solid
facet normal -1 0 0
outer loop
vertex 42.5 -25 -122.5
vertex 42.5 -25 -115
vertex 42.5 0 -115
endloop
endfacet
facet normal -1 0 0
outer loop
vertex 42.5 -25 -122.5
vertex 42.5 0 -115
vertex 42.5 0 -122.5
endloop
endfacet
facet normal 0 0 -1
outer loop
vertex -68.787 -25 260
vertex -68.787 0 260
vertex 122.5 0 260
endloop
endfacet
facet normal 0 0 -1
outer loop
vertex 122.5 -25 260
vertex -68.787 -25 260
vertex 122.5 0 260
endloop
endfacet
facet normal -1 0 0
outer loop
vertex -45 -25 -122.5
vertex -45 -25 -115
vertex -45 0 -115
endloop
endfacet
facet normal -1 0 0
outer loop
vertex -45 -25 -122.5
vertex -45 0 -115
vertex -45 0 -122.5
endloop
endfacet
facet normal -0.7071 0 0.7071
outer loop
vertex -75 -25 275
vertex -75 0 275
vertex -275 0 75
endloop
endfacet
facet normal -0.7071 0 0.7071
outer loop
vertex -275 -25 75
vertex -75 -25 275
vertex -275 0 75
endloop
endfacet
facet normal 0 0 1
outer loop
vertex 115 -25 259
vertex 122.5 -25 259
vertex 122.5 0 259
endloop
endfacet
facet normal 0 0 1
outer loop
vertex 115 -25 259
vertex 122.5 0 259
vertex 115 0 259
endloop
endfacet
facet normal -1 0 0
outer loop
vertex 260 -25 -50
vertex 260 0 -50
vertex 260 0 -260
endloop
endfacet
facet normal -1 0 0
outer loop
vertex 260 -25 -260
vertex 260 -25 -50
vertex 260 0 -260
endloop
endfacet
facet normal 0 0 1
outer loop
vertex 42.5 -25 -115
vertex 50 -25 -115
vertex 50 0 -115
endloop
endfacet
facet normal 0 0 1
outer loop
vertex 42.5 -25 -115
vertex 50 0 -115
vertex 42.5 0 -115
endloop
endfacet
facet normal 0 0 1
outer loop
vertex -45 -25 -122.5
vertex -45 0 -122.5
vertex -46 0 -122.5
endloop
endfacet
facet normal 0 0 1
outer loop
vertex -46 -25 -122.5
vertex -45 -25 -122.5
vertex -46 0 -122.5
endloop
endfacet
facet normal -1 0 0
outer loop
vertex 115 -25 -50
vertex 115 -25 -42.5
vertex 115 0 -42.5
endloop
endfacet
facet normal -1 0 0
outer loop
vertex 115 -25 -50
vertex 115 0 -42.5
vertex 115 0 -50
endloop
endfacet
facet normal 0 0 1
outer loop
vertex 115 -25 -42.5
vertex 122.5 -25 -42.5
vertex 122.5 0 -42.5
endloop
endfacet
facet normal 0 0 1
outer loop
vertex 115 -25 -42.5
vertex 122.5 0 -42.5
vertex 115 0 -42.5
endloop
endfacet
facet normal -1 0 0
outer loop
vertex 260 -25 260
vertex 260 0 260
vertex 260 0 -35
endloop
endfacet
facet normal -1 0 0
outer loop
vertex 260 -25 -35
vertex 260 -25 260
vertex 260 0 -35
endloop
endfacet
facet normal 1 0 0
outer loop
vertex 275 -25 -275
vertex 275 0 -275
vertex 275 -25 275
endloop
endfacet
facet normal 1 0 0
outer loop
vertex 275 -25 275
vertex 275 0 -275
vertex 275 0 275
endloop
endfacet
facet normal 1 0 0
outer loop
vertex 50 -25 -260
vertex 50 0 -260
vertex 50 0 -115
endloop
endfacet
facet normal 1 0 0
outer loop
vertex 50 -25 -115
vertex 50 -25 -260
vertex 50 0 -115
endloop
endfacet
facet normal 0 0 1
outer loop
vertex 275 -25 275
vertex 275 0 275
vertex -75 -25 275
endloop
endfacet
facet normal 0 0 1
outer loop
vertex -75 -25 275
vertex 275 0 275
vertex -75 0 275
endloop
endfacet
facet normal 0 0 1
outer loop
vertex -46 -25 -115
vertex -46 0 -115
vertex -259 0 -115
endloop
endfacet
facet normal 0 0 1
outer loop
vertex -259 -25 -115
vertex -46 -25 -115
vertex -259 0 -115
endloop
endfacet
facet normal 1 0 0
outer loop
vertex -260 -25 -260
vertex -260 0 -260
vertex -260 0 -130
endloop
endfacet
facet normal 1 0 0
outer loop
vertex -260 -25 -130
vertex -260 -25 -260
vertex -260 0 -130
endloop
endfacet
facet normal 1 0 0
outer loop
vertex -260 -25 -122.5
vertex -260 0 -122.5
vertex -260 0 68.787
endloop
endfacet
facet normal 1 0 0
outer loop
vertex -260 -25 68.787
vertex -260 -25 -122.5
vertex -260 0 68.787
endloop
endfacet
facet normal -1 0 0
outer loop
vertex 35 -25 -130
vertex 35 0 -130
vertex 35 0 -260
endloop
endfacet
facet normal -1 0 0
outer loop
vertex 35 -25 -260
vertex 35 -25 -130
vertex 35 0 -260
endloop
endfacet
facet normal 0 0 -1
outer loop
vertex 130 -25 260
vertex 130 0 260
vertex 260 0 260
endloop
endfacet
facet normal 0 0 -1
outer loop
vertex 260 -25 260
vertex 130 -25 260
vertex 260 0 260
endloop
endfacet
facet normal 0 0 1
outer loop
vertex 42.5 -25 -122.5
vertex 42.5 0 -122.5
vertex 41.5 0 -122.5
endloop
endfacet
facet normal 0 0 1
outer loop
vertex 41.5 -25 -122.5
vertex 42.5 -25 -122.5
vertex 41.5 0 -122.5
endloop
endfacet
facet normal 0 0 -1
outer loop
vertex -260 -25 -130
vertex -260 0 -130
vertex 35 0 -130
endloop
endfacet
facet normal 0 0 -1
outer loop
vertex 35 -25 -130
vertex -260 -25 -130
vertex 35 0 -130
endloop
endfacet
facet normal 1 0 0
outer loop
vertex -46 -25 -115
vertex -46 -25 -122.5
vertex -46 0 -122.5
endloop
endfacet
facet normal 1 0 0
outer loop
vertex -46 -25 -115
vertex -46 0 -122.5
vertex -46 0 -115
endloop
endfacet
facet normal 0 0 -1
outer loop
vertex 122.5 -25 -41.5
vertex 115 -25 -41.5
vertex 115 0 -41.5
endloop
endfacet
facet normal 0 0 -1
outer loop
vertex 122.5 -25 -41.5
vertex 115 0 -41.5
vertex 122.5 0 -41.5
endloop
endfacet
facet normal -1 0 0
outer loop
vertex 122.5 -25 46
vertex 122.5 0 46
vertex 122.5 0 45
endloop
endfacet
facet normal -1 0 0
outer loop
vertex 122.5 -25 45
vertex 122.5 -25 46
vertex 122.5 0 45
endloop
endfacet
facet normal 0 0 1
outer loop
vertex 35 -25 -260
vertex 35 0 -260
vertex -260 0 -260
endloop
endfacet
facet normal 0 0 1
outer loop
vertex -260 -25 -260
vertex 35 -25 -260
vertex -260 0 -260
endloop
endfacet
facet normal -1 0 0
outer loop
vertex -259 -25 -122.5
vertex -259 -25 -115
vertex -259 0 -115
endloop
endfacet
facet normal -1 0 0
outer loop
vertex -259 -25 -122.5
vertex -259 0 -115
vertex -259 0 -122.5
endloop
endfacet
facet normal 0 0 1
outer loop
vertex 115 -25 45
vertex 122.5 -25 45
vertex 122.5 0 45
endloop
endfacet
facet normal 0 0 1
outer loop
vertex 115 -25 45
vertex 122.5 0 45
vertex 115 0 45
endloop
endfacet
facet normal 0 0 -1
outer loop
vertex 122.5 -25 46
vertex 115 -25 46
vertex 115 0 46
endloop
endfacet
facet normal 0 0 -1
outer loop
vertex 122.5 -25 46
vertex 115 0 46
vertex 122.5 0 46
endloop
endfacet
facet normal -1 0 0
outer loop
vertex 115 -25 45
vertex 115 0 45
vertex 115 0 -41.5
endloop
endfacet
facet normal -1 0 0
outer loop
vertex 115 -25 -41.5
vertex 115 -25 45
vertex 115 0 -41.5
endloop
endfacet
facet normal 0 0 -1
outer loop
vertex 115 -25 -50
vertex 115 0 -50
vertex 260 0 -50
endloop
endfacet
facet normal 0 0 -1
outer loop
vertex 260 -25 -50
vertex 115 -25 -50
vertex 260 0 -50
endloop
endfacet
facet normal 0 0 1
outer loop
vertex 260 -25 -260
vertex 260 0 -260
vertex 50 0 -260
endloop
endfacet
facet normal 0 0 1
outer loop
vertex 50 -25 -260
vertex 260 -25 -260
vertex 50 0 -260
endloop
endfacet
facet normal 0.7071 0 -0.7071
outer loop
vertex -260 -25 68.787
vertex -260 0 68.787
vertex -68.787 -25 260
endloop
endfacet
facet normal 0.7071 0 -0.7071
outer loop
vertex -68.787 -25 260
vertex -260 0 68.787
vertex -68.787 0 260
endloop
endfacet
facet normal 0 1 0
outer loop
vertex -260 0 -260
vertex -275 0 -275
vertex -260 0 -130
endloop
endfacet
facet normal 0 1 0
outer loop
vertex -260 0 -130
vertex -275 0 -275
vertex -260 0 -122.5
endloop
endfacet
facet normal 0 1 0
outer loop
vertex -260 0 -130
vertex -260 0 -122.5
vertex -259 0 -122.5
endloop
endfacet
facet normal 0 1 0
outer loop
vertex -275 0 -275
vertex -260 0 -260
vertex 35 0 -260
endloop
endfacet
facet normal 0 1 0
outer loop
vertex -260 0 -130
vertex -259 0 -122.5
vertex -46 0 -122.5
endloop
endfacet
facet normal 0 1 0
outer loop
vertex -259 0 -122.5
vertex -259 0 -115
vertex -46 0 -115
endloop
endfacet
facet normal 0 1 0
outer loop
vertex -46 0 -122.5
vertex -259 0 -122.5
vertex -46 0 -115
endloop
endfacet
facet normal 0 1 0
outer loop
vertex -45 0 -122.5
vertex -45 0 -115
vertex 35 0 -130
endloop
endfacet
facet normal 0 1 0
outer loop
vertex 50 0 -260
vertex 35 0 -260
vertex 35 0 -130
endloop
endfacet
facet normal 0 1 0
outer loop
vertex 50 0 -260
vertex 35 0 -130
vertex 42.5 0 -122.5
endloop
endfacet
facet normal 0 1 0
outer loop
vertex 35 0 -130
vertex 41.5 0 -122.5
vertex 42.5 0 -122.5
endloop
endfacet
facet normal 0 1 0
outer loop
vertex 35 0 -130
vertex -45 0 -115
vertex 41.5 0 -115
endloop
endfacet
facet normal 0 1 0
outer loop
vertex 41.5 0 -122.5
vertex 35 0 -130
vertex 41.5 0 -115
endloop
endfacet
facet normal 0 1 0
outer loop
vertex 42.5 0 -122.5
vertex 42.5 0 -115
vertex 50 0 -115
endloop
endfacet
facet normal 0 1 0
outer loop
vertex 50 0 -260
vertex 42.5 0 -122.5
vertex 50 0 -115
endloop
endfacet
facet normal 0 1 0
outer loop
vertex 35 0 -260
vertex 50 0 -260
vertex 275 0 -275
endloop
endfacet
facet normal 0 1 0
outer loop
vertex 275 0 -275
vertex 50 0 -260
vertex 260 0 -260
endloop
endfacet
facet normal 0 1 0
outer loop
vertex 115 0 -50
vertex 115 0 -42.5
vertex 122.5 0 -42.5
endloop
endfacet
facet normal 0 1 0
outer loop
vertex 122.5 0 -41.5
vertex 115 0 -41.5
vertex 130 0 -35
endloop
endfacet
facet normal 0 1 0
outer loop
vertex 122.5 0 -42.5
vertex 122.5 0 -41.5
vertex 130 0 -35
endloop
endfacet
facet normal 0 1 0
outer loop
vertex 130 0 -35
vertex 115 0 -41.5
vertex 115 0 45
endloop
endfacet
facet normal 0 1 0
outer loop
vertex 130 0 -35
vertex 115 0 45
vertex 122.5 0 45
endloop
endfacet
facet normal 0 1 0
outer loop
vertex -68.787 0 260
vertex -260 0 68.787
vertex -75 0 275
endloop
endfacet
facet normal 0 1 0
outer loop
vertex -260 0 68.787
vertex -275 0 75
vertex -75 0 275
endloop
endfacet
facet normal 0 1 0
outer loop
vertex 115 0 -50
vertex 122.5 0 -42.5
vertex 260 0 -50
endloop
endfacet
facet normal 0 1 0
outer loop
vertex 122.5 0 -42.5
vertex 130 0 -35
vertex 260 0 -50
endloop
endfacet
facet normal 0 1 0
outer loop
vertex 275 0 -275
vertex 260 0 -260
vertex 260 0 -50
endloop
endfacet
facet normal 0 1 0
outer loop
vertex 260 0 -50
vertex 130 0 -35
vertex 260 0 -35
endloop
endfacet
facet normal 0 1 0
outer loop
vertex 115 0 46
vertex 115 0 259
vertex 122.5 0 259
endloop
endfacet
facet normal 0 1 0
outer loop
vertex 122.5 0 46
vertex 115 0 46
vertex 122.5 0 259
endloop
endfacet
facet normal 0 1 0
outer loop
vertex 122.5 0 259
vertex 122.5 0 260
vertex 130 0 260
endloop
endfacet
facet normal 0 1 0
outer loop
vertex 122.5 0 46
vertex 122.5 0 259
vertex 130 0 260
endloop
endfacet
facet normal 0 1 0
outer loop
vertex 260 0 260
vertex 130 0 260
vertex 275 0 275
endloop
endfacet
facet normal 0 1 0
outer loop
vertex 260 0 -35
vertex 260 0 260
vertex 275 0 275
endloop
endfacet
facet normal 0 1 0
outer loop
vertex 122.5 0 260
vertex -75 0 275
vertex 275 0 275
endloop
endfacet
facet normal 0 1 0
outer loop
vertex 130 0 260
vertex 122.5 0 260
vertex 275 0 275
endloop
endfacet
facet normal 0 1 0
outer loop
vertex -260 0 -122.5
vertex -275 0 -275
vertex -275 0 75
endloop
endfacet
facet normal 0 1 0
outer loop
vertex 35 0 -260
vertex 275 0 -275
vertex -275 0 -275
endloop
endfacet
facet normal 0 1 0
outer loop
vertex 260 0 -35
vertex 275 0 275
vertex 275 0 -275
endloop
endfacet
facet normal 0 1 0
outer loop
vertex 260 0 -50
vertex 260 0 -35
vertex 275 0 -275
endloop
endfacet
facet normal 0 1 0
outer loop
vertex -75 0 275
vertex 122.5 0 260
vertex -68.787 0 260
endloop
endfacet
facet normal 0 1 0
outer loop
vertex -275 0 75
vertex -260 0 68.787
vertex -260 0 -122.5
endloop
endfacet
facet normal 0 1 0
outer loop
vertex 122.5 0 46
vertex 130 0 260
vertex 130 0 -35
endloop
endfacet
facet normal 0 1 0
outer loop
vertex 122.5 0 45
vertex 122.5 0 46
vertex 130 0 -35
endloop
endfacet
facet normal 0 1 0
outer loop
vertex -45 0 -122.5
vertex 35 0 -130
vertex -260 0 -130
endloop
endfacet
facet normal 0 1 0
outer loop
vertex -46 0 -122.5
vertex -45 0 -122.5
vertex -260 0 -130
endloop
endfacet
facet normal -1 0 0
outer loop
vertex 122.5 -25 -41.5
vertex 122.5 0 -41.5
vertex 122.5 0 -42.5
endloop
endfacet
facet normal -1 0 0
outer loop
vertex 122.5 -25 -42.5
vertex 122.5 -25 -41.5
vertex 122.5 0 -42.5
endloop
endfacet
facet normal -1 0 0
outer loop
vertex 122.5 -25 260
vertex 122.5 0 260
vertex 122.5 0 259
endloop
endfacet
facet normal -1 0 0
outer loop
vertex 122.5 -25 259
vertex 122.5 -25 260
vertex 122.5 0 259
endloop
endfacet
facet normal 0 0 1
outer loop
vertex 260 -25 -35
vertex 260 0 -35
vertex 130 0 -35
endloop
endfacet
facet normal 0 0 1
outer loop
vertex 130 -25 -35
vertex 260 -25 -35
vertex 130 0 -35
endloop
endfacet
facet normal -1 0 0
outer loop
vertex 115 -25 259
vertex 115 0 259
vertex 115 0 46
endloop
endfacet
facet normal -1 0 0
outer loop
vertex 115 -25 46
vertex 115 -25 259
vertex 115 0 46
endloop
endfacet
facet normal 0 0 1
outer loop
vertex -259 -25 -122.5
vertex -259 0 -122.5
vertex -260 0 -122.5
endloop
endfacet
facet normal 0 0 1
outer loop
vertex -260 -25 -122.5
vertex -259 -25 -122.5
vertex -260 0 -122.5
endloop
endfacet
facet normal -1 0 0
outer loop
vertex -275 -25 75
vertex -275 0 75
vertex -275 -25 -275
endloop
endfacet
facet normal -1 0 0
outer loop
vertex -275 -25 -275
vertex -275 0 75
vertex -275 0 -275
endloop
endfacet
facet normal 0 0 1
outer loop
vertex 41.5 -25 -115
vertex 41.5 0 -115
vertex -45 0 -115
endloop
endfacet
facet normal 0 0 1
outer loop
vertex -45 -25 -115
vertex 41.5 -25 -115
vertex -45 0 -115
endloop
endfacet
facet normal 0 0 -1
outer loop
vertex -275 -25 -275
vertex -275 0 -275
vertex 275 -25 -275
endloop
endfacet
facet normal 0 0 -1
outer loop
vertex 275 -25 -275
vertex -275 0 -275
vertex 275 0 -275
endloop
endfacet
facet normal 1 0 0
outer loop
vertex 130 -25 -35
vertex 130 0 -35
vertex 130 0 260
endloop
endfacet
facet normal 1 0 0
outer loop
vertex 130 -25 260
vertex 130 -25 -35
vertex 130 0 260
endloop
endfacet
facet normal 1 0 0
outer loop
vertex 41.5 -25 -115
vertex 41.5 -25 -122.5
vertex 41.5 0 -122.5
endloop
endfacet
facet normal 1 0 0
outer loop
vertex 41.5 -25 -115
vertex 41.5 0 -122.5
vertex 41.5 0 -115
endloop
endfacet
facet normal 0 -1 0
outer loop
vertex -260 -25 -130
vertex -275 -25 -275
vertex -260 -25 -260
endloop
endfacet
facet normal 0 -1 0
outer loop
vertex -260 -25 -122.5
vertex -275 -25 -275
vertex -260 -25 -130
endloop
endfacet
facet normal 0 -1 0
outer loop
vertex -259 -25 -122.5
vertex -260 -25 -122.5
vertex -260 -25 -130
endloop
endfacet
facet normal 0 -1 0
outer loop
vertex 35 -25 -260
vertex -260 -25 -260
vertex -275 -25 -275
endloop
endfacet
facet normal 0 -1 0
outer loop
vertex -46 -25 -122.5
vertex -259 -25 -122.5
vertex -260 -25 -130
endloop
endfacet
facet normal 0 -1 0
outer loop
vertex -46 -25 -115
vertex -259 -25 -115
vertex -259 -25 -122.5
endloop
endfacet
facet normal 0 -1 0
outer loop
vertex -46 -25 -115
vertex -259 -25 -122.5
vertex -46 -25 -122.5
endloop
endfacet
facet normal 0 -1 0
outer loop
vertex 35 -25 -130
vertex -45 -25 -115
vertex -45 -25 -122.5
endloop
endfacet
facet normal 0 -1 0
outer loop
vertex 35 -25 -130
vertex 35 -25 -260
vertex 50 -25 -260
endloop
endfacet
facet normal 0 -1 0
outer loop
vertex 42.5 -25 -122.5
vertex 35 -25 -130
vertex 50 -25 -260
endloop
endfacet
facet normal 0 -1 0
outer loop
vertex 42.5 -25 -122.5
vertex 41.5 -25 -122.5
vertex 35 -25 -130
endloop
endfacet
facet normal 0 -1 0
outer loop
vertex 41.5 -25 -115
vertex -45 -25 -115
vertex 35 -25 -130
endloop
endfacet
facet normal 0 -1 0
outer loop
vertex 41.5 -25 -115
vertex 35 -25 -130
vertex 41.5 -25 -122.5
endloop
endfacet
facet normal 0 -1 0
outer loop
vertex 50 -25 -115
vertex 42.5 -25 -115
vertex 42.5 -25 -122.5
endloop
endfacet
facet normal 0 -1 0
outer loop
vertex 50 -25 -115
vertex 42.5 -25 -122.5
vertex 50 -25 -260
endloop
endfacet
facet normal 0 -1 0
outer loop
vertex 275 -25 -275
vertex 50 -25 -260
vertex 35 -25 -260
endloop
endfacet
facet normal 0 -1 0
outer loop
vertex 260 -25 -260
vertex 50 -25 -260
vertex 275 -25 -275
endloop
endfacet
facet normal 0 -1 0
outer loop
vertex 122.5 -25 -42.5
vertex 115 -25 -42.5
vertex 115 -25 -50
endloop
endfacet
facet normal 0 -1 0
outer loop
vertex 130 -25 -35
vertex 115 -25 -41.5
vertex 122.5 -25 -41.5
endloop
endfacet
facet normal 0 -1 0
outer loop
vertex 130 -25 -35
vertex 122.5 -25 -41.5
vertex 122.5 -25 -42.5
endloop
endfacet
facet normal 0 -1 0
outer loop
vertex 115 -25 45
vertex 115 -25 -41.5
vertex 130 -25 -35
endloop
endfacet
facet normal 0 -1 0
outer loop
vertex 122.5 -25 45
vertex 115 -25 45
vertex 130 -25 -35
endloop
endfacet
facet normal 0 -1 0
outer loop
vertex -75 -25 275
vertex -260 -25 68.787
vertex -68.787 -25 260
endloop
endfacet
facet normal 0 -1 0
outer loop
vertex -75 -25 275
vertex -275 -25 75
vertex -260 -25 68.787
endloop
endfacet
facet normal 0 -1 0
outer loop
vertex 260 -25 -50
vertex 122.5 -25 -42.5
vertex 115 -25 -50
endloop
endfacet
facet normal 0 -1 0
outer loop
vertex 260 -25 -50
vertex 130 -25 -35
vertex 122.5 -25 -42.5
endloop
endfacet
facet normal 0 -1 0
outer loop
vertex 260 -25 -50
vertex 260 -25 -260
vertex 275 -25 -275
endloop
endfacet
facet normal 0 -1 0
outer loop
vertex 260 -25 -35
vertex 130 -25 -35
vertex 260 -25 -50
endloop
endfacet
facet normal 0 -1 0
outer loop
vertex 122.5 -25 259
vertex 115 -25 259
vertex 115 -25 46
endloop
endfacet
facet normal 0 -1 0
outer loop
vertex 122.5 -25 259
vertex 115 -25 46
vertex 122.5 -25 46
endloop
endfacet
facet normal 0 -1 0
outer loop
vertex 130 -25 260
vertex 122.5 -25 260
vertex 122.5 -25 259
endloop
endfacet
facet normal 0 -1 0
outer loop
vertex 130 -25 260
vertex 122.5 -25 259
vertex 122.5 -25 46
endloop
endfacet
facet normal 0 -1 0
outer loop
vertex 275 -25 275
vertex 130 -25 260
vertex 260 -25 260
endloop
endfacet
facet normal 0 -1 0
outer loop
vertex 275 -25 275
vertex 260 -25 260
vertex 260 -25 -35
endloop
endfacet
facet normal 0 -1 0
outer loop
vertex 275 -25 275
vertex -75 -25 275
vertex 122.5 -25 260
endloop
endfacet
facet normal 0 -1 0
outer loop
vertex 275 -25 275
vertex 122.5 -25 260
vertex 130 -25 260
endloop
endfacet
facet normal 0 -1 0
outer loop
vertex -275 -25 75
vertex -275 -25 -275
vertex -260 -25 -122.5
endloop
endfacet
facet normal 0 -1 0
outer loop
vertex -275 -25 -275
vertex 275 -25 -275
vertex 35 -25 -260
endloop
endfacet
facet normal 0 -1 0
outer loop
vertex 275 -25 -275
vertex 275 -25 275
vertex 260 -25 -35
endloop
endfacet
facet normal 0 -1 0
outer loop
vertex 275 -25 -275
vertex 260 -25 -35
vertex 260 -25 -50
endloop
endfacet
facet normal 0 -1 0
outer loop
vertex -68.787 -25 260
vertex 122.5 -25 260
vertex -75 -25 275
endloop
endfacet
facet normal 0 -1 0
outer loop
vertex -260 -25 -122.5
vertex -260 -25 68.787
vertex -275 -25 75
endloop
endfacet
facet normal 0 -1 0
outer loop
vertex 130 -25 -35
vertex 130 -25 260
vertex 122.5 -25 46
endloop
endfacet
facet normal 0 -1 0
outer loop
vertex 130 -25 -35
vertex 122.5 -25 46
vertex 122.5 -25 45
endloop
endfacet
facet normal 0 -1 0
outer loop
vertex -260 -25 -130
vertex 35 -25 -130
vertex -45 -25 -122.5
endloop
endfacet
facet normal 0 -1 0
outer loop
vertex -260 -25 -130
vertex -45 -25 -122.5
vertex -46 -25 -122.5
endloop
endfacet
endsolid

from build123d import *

# Parameters (mm, degrees)
F1_DEPTH = 25


# Not quite as in the source:
# - ends of sketch curves that miss each other by under 0.0002 mm in the source are joined


with BuildPart() as f1:
    # F0 (on Front) → F1 (new body)
    with BuildSketch(Plane.XZ):
        Polygon((-275, 53.7867965644), (-275, -275), (275, -275), (275, 275), (-68.7867965644, 275), (-68.7867965644, 260), (115, 260), (115, 267.5000010639), (130, 267.5000010639), (130, 260), (260, 260), (260, -35), (267.5, -35), (267.5, -50), (260, -50), (260, -260), (50, -260), (50, -267.5), (35, -267.5), (35, -260), (-260, -260), (-260, -130), (-267.5, -130), (-267.5, -115), (-260, -115), (-260, 68.7867965644), (-268.7268512791, 60.0599452853), align=None)
        Polygon((-275, 68.7867965644), (-275, 53.7867965644), (-268.7268512791, 60.0599452853), (-260, 68.7867965644), align=None)
        Polygon((-275, 75), (-275, 68.7867965644), (-260, 68.7867965644), align=None)
        Polygon((-68.7867965644, 260), (-68.7867965644, 275), (-75, 275), align=None)
        Polygon((-79.3933982822, 270.6066017178), (-275, 75), (-260, 68.7867965644), (-68.7867965644, 260), align=None)
        Polygon((-68.7867965644, 260), (-75, 275), (-79.3933982822, 270.6066017178), align=None)
        Polygon((-260, -122.5), (-260, -115), (-267.5, -115), (-267.5, -130), (-260, -130), (35, -130), (35, -260), (35, -267.5), (50, -267.5), (50, -260), (50, -115), (42.5, -115), (42.5, -122.5), (41.5, -122.5), (41.5, -115), (39.3933982822, -115), (-44.3324317381, -115), (-45, -115), (-45, -122.5), (-46, -122.5), (-46, -115), (-258.5857843554, -115), (-259, -115), (-259, -115.414213564), (-259, -122.5), align=None)
        Polygon((115, 267.5000010639), (115, 260), (122.5, 260), (122.5, 259), (115.414213564, 259), (115, 259), (115, 258.5857864337), (115, 46), (122.5, 46), (122.5, 45), (115, 45), (115, -41.5), (122.5, -41.5), (122.5, -42.5), (115, -42.5), (115, -50), (260, -50), (267.5, -50), (267.5, -35), (260, -35), (130, -35), (130, 260), (130, 267.5000010639), align=None)
    extrude(amount=F1_DEPTH)


solid = f1.part
